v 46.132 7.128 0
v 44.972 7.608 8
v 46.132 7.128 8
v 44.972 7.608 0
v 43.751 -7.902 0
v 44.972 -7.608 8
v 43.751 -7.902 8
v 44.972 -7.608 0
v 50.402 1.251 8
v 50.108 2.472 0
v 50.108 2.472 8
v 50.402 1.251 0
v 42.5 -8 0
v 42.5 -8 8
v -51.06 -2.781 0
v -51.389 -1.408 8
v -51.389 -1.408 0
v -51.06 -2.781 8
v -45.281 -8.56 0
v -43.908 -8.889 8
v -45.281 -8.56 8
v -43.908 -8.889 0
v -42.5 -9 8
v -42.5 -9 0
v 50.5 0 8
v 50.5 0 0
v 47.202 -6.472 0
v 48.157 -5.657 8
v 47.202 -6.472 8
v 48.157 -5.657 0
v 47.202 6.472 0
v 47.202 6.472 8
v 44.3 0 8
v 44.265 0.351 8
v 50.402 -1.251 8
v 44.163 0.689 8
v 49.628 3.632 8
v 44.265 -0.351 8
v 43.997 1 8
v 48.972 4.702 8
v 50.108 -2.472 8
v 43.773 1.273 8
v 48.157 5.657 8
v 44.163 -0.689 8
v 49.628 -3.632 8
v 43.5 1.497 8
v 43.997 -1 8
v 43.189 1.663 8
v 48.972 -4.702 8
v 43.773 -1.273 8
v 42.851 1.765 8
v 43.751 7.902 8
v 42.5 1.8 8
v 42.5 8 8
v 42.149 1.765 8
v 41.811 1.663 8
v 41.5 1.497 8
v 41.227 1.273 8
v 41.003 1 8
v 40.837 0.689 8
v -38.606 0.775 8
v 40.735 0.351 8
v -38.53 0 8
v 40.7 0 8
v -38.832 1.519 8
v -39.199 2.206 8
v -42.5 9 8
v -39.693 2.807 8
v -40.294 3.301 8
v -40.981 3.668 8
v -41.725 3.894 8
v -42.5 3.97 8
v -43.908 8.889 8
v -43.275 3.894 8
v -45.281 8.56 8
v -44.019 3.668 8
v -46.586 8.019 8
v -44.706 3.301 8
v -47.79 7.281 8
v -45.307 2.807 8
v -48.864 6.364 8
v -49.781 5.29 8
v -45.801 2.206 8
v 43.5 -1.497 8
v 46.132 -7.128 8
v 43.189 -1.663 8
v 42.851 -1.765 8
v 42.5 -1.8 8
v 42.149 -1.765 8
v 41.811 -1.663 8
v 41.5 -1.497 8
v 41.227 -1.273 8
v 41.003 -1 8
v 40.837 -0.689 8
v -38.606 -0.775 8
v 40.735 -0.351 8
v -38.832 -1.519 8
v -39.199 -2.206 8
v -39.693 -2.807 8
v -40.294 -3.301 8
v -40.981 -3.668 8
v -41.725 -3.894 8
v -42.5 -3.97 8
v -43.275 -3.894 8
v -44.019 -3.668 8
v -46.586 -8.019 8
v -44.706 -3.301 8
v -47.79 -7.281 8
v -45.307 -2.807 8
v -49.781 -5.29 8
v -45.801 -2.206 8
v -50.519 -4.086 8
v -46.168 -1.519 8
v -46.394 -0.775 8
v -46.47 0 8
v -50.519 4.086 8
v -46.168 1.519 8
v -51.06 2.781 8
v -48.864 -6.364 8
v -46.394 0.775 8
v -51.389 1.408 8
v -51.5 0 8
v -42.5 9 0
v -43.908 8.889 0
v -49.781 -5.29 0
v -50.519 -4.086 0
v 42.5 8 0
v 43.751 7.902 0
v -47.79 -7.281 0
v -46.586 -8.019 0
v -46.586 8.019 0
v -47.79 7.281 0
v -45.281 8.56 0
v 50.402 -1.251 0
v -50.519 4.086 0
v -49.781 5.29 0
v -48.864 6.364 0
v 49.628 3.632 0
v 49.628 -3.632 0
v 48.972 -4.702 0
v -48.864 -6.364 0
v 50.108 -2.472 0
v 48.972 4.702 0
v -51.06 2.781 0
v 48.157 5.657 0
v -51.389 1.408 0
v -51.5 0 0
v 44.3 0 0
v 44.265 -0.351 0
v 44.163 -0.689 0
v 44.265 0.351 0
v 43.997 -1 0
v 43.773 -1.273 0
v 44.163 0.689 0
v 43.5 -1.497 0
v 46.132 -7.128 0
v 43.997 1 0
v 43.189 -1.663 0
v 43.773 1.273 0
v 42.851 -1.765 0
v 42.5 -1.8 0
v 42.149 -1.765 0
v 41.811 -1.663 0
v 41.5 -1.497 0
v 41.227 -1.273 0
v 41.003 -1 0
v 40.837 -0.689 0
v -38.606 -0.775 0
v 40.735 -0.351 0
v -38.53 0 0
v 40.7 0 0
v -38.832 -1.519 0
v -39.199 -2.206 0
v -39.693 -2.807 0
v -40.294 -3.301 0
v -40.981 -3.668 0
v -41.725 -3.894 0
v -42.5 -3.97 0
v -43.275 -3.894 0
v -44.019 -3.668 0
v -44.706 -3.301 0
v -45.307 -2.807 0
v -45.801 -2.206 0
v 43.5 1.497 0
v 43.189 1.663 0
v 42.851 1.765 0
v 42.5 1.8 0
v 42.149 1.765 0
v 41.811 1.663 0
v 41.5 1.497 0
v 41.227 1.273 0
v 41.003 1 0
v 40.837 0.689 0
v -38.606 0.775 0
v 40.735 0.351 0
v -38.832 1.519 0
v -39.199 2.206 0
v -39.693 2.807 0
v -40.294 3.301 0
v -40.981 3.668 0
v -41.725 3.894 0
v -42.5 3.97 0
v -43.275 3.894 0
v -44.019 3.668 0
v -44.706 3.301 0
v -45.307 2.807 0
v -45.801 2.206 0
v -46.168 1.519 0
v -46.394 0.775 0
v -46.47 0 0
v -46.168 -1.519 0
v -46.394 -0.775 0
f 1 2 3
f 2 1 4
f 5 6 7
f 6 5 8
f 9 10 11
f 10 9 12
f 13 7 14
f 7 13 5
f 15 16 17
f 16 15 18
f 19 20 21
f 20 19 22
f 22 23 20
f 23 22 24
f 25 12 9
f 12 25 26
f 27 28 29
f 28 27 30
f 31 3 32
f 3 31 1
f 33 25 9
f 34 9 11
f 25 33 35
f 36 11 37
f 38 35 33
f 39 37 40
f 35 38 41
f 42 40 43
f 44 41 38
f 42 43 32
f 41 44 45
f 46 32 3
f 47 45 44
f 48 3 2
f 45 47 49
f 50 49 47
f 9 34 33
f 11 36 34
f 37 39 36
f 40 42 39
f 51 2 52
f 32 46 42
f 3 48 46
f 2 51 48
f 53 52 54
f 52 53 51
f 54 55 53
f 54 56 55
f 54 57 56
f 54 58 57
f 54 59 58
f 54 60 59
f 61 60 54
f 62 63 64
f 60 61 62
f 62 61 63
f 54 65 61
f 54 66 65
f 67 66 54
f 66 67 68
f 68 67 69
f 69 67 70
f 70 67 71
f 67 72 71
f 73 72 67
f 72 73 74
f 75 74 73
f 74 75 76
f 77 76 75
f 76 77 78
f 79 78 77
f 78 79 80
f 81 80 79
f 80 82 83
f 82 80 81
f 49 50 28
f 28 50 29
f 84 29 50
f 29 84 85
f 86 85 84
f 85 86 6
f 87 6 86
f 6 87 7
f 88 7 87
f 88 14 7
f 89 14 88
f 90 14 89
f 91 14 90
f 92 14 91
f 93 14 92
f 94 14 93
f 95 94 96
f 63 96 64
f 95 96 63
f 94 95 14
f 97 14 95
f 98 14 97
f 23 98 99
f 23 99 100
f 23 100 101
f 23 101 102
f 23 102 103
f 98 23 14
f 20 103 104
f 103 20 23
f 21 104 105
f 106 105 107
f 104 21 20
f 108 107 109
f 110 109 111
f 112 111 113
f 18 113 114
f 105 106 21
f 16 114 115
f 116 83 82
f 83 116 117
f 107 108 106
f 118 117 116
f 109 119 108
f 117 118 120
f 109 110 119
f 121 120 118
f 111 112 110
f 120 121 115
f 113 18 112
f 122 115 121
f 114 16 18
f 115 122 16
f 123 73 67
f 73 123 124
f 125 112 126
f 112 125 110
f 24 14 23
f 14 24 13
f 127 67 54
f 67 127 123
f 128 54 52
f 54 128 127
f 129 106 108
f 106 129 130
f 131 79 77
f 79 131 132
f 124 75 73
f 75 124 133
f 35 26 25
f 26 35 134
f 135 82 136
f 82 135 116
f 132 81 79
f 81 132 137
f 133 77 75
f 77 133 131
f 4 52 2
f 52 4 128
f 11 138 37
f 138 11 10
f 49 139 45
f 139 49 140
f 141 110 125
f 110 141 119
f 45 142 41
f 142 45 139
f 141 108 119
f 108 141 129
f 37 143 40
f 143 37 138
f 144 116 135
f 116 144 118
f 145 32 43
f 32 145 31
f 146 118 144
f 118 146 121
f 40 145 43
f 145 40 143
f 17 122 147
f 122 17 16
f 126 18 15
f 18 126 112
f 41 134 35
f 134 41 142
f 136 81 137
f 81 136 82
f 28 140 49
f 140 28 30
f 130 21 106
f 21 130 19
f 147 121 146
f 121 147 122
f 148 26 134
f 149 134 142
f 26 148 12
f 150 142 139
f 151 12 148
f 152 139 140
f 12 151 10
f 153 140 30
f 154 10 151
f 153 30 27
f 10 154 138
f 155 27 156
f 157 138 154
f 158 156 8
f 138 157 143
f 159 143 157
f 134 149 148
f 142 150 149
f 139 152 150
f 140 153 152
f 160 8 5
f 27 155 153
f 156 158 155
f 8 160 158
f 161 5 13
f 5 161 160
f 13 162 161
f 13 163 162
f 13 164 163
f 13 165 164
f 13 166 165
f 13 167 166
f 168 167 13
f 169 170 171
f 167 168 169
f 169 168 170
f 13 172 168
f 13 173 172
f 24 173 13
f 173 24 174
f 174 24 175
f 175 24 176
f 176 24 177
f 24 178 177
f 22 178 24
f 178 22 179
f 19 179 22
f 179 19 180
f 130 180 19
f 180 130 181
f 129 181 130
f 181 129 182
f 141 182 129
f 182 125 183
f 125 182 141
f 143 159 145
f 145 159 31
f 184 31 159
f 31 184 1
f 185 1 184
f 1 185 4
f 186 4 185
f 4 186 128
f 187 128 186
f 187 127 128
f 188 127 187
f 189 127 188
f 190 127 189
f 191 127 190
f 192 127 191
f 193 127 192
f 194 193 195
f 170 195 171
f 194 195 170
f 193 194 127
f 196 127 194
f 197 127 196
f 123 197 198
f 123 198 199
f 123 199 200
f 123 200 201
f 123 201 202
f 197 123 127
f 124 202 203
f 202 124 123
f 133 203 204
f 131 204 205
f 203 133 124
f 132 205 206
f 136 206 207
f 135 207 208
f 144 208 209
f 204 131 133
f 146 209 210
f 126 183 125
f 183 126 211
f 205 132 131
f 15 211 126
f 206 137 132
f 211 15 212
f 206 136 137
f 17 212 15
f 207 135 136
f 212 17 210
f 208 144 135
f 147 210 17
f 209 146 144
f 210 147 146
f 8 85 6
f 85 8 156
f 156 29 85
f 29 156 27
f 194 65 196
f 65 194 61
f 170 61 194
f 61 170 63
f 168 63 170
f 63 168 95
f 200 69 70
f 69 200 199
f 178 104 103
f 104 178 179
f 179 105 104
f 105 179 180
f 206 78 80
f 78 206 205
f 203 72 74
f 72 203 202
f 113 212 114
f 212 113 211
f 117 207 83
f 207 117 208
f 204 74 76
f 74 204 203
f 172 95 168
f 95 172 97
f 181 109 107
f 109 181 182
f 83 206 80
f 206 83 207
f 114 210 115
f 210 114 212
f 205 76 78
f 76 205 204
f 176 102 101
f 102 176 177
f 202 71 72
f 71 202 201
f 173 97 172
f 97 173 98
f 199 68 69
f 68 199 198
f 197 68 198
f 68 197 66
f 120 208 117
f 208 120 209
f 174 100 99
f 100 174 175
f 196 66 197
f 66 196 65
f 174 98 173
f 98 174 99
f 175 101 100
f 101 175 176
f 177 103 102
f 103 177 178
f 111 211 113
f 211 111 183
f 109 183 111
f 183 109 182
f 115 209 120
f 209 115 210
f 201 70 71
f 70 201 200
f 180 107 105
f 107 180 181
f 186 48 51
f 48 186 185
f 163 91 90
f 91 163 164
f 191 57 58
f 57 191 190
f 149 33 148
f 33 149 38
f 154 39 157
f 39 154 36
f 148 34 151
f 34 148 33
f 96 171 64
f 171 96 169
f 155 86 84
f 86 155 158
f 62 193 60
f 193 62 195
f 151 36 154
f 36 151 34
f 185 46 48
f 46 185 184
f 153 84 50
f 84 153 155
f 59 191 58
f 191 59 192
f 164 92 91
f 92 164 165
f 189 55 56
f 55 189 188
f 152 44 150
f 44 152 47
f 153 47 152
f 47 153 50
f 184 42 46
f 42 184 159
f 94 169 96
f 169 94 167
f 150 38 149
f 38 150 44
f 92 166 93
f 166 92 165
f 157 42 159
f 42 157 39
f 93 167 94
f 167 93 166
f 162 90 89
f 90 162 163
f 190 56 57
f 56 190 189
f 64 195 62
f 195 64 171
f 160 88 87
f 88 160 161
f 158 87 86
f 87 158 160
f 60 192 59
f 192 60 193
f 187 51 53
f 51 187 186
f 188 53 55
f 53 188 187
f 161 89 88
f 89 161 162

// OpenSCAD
$fn = 32;

// ----------------------------------------------------------------------
// Lever: 85 mm between the bosses, 8 mm thick, smooth outline
// ----------------------------------------------------------------------

// --- parameters (mm) ---
lever_l = 85;             // distance between the boss centres
boss_a = 18;              // first boss diameter
boss_b = 16;              // second boss diameter
bore_a = 7.94;            // first bore
bore_b = 3.6;             // second bore
lever_t = 8;              // lever thickness

lever_profile = [[-51.5, 0], [-51.389, -1.408], [-51.06, -2.781], [-50.519, -4.086], [-49.781, -5.29], [-48.864, -6.364], [-47.79, -7.281], [-46.586, -8.019], [-45.281, -8.56], [-43.908, -8.889], [-42.5, -9], [42.5, -8], [43.751, -7.902], [44.972, -7.608], [46.132, -7.128], [47.202, -6.472], [48.157, -5.657], [48.972, -4.702], [49.628, -3.632], [50.108, -2.472], [50.402, -1.251], [50.5, 0], [50.402, 1.251], [50.108, 2.472], [49.628, 3.632], [48.972, 4.702], [48.157, 5.657], [47.202, 6.472], [46.132, 7.128], [44.972, 7.608], [43.751, 7.902], [42.5, 8], [-42.5, 9], [-43.908, 8.889], [-45.281, 8.56], [-46.586, 8.019], [-47.79, 7.281], [-48.864, 6.364], [-49.781, 5.29], [-50.519, 4.086], [-51.06, 2.781], [-51.389, 1.408]];

difference() {
  linear_extrude(height = lever_t) polygon(lever_profile);
  translate([-42.5, 0, -2.5]) cylinder(h = lever_t + 5, d = bore_a);
  translate([42.5, 0, -2.5]) cylinder(h = lever_t + 5, d = bore_b);
}
